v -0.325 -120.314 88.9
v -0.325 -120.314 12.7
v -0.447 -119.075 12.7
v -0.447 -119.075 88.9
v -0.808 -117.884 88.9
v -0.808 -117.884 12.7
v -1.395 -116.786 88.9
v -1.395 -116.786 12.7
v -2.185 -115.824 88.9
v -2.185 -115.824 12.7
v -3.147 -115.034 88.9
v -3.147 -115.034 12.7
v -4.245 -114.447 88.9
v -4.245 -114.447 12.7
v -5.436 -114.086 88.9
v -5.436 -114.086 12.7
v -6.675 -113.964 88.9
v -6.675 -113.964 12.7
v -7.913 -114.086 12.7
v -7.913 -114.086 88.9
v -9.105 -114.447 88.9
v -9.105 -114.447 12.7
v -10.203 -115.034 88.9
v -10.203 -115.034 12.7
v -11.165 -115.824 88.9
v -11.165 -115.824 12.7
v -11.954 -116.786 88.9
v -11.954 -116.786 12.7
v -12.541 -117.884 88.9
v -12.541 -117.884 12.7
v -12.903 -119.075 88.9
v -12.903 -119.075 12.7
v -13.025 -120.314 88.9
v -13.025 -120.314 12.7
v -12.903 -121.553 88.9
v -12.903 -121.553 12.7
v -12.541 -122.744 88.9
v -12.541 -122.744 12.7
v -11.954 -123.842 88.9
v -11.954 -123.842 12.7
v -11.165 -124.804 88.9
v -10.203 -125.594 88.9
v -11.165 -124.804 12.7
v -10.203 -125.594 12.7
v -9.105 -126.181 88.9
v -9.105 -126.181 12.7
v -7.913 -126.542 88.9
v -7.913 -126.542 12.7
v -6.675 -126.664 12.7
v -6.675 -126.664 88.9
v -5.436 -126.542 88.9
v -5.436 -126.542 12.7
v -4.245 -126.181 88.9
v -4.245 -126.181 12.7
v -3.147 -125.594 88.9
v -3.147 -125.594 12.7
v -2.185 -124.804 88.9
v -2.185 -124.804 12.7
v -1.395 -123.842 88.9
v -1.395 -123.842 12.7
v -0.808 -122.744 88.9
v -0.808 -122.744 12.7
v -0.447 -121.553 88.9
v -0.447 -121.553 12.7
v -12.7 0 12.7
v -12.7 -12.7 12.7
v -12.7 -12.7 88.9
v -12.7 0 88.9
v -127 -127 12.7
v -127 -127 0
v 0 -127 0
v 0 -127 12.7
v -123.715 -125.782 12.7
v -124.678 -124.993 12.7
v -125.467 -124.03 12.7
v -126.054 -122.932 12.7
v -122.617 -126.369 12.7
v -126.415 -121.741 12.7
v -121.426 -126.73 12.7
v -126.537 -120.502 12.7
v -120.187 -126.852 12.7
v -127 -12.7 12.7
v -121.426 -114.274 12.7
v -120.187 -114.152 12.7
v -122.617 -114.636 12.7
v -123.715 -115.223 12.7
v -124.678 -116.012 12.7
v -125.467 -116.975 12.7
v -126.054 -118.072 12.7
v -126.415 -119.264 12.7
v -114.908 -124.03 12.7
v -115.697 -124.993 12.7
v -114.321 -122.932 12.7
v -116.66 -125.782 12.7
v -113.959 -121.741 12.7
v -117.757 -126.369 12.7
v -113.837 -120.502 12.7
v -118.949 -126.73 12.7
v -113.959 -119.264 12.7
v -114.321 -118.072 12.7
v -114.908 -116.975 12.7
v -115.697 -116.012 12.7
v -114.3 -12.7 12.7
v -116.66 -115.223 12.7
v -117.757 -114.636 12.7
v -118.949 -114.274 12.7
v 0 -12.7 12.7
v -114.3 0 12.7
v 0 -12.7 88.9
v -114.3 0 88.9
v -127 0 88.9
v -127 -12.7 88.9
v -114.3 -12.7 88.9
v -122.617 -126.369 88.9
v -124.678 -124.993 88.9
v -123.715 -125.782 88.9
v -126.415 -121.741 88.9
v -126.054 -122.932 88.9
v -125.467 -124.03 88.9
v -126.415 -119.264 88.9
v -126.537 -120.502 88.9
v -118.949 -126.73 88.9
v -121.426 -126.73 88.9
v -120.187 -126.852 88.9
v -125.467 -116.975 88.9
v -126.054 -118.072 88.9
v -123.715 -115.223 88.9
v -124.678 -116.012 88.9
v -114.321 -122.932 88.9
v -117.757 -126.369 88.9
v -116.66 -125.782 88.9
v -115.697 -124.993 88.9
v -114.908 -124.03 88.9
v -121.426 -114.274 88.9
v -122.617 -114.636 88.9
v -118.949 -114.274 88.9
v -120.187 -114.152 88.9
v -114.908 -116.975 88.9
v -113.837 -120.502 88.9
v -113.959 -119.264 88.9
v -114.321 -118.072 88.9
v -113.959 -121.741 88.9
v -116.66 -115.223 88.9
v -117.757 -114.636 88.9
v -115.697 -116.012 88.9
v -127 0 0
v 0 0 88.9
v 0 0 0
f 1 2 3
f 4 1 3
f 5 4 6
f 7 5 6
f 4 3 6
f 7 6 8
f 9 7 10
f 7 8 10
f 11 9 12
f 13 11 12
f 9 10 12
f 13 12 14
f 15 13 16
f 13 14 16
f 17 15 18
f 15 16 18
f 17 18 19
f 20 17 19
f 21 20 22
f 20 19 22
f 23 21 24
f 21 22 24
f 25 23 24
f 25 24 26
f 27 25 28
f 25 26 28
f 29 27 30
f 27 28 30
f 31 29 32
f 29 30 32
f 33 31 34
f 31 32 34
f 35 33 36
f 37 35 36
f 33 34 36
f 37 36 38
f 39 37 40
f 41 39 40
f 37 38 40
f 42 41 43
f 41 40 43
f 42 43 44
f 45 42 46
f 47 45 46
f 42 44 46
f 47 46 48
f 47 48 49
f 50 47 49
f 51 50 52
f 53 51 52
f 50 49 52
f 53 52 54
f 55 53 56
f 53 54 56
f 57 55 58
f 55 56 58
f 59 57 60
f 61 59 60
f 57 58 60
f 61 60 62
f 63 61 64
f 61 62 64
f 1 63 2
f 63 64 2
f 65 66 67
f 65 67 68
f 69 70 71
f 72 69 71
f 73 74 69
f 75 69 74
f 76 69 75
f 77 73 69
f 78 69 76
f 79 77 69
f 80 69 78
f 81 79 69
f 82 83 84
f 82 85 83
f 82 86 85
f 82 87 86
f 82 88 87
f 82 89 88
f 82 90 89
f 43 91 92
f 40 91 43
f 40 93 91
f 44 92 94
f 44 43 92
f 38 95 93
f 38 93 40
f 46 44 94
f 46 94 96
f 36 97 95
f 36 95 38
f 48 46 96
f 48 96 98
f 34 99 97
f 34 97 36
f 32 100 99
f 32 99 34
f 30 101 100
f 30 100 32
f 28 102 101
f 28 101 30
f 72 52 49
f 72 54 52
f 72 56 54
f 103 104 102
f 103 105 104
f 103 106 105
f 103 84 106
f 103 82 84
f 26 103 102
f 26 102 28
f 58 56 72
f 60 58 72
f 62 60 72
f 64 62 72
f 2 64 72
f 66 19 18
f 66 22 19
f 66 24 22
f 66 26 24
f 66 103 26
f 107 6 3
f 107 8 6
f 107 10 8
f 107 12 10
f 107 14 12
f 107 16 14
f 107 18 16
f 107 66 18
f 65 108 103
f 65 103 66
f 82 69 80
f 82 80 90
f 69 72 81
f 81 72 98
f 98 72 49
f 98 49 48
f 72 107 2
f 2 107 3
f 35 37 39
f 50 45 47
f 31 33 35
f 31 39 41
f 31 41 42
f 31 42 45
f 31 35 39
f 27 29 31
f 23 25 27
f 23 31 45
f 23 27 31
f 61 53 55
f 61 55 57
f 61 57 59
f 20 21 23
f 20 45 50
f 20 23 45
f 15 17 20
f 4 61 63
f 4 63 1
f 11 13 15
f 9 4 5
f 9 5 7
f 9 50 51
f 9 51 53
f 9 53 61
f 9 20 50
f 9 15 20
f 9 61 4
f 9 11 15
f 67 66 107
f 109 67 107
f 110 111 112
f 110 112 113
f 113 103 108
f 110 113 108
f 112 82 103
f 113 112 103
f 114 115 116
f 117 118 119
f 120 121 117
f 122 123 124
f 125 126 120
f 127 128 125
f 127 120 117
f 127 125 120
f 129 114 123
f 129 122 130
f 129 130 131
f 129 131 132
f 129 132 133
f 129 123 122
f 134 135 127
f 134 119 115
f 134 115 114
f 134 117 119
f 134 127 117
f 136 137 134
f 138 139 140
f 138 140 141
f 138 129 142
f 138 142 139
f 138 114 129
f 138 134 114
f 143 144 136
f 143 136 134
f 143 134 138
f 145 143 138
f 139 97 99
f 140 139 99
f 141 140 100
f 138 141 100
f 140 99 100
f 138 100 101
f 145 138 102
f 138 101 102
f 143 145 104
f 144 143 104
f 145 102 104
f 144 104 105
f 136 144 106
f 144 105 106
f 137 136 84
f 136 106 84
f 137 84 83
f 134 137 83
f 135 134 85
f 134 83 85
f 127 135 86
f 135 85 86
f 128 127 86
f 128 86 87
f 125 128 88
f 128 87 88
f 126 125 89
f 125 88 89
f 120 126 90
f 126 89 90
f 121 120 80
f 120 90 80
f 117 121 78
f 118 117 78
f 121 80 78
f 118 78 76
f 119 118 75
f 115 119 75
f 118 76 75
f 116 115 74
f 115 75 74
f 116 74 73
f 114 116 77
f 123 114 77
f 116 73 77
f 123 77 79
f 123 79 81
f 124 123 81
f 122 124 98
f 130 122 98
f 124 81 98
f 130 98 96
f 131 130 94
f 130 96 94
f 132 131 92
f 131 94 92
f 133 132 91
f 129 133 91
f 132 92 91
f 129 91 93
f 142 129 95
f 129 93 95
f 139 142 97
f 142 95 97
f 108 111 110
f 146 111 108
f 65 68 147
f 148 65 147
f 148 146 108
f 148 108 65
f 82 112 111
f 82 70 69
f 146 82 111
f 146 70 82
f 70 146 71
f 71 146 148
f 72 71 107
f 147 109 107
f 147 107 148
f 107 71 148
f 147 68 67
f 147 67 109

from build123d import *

# Parameters (mm, degrees)
F0_W     = 127
F0_H     = 127
F1_DEPTH = 12.7
F2_W     = 12.7
F2_H     = 12.7
F2_R     = 6.35
F3_DEPTH = 76.2


# Not quite as in the source:
# - a feature names something its author has since deleted; it is built from what else it names


with BuildPart() as f1:
    # F0 (on Top) → F1 (new body)
    with BuildSketch(Plane.XY):
        with Locations((-63.5, -63.5)):
            Rectangle(F0_W, F0_H)
    extrude(amount=F1_DEPTH)

    # F2 (on face) → F3 (join)
    with BuildSketch(Plane.XY.offset(12.7)):
        with Locations((-120.65, -6.35)):
            Rectangle(F2_W, F2_H)
        with Locations((-6.35, -6.35)):
            Rectangle(F2_W, F2_H)
        with Locations((-120.1874390244, -120.5023750663)):
            Circle(F2_R)
        with Locations((-6.6746613011, -120.3140169382)):
            Circle(F2_R)
    extrude(amount=F3_DEPTH)


solid = f1.part
